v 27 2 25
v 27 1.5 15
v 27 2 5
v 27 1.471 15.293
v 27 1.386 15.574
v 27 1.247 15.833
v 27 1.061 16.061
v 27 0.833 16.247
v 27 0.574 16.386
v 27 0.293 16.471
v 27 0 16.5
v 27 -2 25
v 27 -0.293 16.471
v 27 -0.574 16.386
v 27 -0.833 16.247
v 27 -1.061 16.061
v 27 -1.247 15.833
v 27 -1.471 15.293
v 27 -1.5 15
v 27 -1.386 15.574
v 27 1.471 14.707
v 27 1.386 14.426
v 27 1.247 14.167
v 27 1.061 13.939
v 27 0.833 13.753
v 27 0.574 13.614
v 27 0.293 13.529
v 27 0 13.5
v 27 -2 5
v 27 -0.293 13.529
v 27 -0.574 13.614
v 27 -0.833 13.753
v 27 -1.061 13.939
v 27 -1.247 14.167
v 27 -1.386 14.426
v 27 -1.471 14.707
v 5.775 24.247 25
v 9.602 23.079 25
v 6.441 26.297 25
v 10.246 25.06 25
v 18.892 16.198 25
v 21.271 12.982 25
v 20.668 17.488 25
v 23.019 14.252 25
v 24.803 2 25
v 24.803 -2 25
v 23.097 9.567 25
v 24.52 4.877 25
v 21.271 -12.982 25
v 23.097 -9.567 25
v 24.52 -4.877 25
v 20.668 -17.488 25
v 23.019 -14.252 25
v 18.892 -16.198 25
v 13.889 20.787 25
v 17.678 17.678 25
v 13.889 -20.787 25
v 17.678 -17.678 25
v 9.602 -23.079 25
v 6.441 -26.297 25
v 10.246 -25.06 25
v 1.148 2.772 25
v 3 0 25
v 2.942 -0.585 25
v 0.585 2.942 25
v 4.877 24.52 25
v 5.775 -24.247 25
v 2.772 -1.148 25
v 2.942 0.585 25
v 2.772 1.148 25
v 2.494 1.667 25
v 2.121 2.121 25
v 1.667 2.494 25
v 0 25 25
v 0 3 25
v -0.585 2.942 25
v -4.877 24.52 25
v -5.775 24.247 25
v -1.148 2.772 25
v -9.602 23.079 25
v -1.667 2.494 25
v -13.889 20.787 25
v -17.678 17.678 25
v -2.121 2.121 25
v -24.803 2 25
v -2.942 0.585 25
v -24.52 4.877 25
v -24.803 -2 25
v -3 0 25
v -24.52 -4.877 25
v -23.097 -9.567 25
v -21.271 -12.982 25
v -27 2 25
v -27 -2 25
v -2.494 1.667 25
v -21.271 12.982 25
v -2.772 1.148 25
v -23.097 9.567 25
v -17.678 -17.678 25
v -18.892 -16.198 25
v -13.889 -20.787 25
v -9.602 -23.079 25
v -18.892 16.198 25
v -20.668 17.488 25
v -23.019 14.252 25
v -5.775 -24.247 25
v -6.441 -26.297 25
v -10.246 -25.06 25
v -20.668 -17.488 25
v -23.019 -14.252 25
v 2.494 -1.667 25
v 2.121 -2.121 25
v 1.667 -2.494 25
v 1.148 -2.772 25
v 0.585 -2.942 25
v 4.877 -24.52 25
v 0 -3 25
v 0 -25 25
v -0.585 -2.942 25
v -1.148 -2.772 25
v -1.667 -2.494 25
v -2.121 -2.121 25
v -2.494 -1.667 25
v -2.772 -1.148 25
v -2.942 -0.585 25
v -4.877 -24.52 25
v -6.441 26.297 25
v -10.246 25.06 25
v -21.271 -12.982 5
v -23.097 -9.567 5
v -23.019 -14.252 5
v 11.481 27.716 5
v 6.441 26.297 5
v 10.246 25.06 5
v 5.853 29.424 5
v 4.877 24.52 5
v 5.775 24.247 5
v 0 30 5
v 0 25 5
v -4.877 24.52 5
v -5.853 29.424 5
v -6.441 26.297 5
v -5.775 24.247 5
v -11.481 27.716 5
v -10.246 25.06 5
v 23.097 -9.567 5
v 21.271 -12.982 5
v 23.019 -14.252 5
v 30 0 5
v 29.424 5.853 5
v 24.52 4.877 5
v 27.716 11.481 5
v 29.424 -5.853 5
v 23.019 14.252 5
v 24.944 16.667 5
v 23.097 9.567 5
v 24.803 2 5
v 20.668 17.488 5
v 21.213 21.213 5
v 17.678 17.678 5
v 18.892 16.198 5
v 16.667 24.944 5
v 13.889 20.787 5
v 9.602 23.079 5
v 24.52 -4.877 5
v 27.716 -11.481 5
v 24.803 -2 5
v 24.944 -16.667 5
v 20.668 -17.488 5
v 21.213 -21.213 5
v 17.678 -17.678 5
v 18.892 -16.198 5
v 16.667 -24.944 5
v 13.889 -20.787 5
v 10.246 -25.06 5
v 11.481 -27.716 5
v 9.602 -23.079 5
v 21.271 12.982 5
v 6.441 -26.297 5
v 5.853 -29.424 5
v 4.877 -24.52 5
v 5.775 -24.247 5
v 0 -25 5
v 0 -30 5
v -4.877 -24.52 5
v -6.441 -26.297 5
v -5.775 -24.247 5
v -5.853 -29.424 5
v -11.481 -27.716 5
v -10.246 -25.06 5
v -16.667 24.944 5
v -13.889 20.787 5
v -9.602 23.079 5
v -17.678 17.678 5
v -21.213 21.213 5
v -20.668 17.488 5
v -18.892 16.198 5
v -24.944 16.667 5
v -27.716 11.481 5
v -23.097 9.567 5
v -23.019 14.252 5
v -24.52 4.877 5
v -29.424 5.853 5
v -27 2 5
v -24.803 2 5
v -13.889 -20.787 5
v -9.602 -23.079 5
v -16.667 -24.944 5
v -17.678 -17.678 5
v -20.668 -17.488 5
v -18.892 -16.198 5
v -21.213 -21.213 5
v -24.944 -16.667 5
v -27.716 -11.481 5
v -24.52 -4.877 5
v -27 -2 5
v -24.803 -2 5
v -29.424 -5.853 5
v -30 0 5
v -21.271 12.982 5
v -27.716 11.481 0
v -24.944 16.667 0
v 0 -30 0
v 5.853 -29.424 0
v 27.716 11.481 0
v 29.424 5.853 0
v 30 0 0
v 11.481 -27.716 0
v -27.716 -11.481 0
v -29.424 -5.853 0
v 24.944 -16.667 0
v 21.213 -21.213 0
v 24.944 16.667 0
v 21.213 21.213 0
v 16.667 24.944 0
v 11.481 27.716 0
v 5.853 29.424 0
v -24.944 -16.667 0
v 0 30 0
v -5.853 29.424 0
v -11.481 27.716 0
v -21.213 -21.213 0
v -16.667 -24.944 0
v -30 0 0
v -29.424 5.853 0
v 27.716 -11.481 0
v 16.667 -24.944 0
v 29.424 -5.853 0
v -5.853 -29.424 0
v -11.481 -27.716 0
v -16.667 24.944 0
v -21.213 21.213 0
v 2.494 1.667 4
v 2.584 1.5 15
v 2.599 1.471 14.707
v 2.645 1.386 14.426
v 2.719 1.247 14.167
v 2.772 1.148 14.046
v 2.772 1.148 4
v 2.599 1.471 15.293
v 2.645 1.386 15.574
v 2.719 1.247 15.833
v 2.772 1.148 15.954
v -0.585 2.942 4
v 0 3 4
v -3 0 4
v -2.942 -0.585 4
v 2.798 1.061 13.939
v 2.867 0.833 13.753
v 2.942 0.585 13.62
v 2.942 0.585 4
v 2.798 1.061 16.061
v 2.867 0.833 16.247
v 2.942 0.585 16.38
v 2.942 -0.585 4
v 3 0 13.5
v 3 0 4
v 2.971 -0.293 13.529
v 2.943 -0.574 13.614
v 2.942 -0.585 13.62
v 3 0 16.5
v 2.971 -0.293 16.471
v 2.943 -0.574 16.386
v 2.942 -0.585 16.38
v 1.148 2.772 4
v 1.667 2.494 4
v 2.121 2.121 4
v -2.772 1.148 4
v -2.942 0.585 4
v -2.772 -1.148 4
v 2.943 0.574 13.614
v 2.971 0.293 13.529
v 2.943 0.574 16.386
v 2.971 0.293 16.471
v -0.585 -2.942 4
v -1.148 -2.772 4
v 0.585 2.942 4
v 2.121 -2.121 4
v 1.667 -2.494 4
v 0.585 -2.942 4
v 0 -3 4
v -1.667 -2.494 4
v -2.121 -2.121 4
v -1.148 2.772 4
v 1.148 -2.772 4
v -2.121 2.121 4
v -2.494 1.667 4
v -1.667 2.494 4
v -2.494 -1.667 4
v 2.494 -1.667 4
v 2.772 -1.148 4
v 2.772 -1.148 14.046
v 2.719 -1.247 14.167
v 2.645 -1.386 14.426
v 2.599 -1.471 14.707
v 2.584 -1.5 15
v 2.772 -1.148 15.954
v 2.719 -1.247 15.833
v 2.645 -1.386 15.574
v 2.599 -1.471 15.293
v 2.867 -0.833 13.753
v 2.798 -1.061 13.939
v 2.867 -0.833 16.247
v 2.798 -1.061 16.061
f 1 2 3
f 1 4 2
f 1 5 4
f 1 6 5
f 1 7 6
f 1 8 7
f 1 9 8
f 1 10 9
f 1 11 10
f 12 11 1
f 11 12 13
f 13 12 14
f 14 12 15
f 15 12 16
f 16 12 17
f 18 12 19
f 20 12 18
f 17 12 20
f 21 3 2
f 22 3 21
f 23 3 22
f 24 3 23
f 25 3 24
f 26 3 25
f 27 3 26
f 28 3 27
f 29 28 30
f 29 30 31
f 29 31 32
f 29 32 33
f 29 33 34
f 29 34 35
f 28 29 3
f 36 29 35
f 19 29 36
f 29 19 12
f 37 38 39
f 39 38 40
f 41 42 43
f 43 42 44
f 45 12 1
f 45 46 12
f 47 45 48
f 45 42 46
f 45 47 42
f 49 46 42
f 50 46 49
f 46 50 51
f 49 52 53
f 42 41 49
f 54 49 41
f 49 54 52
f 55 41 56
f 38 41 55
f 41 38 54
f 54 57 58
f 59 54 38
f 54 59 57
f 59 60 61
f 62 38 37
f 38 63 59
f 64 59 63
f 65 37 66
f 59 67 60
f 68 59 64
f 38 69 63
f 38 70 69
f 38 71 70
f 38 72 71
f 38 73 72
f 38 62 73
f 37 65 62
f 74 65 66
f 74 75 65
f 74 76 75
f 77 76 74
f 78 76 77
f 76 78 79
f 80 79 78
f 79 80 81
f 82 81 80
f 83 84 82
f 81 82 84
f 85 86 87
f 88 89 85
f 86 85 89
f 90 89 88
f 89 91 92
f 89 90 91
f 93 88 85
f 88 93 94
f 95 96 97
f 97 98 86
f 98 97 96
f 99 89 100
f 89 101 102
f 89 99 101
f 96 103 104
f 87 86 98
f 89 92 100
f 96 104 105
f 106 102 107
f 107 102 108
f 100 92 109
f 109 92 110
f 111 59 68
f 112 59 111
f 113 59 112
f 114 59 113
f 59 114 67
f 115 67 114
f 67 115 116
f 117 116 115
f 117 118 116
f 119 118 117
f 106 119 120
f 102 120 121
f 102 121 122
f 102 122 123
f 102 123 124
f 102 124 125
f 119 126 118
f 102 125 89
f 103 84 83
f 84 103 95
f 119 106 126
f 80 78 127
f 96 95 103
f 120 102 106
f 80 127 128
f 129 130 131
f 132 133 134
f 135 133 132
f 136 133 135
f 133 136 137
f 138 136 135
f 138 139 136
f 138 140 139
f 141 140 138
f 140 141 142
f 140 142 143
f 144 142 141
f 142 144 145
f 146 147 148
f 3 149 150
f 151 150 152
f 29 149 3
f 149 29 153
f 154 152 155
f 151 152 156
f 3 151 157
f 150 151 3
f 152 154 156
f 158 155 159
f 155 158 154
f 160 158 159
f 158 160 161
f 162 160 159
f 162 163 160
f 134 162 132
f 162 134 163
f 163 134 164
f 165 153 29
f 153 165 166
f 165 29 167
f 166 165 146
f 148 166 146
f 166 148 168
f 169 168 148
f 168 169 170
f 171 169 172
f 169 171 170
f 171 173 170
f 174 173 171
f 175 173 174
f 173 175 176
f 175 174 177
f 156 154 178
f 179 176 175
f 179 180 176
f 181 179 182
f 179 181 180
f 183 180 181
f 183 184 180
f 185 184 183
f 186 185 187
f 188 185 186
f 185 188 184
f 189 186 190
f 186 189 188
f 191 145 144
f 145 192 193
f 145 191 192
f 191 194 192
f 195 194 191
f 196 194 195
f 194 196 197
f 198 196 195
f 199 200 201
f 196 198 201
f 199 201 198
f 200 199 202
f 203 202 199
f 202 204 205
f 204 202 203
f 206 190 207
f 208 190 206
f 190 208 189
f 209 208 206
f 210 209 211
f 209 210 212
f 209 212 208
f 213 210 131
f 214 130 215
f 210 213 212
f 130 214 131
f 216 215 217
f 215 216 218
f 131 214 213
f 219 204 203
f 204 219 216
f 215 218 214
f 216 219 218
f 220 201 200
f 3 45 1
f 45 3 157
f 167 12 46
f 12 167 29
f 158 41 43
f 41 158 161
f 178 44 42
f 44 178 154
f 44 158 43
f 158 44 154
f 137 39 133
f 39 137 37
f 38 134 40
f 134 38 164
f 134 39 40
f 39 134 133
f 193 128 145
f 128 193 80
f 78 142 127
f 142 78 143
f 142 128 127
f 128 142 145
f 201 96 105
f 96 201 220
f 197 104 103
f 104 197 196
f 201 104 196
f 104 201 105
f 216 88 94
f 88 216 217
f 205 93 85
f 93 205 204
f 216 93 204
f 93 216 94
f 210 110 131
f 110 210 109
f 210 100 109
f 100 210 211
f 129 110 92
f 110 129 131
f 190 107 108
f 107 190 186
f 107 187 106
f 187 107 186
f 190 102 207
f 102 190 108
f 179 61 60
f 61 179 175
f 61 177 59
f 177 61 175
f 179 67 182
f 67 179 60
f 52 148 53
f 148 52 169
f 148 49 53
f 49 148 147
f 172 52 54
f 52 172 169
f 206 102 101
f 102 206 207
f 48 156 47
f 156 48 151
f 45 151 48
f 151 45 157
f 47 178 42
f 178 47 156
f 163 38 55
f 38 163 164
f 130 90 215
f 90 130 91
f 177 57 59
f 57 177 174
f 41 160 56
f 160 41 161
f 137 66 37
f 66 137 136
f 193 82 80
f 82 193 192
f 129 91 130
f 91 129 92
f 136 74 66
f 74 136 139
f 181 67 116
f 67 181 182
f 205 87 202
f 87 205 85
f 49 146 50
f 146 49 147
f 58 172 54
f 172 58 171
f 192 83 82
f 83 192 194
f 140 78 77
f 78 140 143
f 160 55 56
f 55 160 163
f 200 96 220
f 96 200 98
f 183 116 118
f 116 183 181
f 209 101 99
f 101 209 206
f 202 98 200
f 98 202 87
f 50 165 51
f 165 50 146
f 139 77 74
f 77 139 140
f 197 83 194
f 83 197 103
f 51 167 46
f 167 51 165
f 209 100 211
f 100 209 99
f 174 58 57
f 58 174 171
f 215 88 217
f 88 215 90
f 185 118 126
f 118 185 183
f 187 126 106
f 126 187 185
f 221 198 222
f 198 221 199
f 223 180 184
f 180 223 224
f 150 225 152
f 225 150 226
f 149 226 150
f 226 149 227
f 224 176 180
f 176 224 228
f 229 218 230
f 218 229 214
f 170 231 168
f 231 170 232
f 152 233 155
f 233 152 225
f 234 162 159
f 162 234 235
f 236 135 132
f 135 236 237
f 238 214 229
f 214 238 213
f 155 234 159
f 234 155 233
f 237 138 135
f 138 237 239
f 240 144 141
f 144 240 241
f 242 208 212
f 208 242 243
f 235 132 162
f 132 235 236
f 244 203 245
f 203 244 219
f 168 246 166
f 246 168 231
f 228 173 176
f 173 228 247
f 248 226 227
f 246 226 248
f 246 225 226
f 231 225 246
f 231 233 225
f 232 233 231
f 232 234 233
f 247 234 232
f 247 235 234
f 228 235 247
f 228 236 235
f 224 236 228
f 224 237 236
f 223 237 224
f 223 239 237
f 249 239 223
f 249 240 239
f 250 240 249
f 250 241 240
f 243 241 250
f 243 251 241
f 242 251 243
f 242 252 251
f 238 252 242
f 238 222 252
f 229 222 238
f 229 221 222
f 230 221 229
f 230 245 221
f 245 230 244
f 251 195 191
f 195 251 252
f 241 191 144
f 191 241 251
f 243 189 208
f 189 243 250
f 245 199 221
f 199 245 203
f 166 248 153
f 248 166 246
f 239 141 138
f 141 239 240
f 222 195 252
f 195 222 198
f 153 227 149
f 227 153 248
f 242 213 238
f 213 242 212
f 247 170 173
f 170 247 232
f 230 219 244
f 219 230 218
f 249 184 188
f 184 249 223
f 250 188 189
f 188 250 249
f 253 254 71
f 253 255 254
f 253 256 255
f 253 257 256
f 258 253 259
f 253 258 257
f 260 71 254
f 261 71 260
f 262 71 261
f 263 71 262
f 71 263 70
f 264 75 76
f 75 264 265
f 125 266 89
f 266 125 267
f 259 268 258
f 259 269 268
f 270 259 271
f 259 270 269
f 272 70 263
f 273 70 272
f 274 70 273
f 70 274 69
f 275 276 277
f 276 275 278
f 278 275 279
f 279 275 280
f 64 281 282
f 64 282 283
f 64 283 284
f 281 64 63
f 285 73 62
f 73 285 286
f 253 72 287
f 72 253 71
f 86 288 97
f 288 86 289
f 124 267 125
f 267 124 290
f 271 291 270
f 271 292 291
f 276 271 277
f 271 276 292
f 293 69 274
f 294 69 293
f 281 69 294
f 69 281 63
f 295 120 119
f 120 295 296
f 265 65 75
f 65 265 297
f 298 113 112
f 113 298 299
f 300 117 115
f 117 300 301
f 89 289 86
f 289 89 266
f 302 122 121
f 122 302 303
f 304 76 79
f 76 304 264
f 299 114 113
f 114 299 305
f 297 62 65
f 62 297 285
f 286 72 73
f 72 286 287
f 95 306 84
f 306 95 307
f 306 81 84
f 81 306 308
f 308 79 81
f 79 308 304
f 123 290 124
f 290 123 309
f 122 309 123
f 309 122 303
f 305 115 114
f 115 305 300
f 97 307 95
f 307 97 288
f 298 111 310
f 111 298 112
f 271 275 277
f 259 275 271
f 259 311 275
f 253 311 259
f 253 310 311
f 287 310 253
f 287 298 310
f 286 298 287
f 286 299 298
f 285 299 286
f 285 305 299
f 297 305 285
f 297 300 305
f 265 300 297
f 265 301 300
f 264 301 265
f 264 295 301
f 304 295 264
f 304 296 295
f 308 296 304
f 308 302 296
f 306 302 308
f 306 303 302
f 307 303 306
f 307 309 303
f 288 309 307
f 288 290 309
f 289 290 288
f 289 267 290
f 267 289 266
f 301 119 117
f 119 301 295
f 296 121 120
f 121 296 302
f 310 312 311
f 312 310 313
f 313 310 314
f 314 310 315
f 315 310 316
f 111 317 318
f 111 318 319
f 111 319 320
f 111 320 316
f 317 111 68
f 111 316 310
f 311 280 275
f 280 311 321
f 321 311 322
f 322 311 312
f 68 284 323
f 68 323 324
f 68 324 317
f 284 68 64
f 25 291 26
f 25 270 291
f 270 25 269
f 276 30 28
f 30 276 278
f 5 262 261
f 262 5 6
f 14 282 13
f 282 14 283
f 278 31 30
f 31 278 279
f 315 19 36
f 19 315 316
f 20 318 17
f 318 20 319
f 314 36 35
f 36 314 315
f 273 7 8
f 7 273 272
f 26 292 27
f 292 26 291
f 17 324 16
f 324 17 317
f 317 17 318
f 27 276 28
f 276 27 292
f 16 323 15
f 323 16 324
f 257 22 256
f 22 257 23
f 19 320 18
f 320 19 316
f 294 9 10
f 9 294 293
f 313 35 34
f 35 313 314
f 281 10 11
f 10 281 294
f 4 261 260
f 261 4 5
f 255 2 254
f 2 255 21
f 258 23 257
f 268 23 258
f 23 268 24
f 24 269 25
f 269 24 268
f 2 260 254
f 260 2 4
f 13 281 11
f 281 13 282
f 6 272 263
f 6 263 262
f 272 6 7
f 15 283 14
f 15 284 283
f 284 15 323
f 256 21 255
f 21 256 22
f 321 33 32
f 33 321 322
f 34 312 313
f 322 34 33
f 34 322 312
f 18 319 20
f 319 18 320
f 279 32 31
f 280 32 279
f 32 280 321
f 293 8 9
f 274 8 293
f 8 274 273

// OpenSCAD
$fn = 32;

// ----------------------------------------------------------------------
// Control knob: skirt knob with grip ribs
// ----------------------------------------------------------------------

// --- parameters (mm) ---
skirt_d = 60;             // skirt diameter
skirt_t = 5;              // skirt thickness
rib_w = 4;                // grip rib width
rib_out = 3;              // grip rib radial protrusion
n_ribs = 10;              // number of grip ribs
knob_d = 50;              // knob body diameter
knob_h = 20;              // knob body height
bore_d = 6;               // shaft bore diameter
set_d = 3;                // set screw bore diameter

rib_step = 360 / n_ribs;  // rib angular step
total_h = skirt_t + knob_h;  // overall height

difference() {
  union() {
    translate([0, 0, skirt_t]) cylinder(h = knob_h, d = knob_d);
    cylinder(h = skirt_t, d = skirt_d);
    for (i = [0 : n_ribs - 1])
      rotate([0, 0, i * rib_step])
        translate([knob_d / 2 - 1, -rib_w / 2, skirt_t])
          cube([rib_out, rib_w, knob_h]);
  }
  translate([0, 0, skirt_t - 1]) cylinder(h = knob_h + 2, d = bore_d);
  translate([-1, 0, skirt_t + knob_h / 2]) rotate([0, 90, 0])
    cylinder(h = knob_d / 2 + bore_d / 2 + 2, d = set_d);
}
